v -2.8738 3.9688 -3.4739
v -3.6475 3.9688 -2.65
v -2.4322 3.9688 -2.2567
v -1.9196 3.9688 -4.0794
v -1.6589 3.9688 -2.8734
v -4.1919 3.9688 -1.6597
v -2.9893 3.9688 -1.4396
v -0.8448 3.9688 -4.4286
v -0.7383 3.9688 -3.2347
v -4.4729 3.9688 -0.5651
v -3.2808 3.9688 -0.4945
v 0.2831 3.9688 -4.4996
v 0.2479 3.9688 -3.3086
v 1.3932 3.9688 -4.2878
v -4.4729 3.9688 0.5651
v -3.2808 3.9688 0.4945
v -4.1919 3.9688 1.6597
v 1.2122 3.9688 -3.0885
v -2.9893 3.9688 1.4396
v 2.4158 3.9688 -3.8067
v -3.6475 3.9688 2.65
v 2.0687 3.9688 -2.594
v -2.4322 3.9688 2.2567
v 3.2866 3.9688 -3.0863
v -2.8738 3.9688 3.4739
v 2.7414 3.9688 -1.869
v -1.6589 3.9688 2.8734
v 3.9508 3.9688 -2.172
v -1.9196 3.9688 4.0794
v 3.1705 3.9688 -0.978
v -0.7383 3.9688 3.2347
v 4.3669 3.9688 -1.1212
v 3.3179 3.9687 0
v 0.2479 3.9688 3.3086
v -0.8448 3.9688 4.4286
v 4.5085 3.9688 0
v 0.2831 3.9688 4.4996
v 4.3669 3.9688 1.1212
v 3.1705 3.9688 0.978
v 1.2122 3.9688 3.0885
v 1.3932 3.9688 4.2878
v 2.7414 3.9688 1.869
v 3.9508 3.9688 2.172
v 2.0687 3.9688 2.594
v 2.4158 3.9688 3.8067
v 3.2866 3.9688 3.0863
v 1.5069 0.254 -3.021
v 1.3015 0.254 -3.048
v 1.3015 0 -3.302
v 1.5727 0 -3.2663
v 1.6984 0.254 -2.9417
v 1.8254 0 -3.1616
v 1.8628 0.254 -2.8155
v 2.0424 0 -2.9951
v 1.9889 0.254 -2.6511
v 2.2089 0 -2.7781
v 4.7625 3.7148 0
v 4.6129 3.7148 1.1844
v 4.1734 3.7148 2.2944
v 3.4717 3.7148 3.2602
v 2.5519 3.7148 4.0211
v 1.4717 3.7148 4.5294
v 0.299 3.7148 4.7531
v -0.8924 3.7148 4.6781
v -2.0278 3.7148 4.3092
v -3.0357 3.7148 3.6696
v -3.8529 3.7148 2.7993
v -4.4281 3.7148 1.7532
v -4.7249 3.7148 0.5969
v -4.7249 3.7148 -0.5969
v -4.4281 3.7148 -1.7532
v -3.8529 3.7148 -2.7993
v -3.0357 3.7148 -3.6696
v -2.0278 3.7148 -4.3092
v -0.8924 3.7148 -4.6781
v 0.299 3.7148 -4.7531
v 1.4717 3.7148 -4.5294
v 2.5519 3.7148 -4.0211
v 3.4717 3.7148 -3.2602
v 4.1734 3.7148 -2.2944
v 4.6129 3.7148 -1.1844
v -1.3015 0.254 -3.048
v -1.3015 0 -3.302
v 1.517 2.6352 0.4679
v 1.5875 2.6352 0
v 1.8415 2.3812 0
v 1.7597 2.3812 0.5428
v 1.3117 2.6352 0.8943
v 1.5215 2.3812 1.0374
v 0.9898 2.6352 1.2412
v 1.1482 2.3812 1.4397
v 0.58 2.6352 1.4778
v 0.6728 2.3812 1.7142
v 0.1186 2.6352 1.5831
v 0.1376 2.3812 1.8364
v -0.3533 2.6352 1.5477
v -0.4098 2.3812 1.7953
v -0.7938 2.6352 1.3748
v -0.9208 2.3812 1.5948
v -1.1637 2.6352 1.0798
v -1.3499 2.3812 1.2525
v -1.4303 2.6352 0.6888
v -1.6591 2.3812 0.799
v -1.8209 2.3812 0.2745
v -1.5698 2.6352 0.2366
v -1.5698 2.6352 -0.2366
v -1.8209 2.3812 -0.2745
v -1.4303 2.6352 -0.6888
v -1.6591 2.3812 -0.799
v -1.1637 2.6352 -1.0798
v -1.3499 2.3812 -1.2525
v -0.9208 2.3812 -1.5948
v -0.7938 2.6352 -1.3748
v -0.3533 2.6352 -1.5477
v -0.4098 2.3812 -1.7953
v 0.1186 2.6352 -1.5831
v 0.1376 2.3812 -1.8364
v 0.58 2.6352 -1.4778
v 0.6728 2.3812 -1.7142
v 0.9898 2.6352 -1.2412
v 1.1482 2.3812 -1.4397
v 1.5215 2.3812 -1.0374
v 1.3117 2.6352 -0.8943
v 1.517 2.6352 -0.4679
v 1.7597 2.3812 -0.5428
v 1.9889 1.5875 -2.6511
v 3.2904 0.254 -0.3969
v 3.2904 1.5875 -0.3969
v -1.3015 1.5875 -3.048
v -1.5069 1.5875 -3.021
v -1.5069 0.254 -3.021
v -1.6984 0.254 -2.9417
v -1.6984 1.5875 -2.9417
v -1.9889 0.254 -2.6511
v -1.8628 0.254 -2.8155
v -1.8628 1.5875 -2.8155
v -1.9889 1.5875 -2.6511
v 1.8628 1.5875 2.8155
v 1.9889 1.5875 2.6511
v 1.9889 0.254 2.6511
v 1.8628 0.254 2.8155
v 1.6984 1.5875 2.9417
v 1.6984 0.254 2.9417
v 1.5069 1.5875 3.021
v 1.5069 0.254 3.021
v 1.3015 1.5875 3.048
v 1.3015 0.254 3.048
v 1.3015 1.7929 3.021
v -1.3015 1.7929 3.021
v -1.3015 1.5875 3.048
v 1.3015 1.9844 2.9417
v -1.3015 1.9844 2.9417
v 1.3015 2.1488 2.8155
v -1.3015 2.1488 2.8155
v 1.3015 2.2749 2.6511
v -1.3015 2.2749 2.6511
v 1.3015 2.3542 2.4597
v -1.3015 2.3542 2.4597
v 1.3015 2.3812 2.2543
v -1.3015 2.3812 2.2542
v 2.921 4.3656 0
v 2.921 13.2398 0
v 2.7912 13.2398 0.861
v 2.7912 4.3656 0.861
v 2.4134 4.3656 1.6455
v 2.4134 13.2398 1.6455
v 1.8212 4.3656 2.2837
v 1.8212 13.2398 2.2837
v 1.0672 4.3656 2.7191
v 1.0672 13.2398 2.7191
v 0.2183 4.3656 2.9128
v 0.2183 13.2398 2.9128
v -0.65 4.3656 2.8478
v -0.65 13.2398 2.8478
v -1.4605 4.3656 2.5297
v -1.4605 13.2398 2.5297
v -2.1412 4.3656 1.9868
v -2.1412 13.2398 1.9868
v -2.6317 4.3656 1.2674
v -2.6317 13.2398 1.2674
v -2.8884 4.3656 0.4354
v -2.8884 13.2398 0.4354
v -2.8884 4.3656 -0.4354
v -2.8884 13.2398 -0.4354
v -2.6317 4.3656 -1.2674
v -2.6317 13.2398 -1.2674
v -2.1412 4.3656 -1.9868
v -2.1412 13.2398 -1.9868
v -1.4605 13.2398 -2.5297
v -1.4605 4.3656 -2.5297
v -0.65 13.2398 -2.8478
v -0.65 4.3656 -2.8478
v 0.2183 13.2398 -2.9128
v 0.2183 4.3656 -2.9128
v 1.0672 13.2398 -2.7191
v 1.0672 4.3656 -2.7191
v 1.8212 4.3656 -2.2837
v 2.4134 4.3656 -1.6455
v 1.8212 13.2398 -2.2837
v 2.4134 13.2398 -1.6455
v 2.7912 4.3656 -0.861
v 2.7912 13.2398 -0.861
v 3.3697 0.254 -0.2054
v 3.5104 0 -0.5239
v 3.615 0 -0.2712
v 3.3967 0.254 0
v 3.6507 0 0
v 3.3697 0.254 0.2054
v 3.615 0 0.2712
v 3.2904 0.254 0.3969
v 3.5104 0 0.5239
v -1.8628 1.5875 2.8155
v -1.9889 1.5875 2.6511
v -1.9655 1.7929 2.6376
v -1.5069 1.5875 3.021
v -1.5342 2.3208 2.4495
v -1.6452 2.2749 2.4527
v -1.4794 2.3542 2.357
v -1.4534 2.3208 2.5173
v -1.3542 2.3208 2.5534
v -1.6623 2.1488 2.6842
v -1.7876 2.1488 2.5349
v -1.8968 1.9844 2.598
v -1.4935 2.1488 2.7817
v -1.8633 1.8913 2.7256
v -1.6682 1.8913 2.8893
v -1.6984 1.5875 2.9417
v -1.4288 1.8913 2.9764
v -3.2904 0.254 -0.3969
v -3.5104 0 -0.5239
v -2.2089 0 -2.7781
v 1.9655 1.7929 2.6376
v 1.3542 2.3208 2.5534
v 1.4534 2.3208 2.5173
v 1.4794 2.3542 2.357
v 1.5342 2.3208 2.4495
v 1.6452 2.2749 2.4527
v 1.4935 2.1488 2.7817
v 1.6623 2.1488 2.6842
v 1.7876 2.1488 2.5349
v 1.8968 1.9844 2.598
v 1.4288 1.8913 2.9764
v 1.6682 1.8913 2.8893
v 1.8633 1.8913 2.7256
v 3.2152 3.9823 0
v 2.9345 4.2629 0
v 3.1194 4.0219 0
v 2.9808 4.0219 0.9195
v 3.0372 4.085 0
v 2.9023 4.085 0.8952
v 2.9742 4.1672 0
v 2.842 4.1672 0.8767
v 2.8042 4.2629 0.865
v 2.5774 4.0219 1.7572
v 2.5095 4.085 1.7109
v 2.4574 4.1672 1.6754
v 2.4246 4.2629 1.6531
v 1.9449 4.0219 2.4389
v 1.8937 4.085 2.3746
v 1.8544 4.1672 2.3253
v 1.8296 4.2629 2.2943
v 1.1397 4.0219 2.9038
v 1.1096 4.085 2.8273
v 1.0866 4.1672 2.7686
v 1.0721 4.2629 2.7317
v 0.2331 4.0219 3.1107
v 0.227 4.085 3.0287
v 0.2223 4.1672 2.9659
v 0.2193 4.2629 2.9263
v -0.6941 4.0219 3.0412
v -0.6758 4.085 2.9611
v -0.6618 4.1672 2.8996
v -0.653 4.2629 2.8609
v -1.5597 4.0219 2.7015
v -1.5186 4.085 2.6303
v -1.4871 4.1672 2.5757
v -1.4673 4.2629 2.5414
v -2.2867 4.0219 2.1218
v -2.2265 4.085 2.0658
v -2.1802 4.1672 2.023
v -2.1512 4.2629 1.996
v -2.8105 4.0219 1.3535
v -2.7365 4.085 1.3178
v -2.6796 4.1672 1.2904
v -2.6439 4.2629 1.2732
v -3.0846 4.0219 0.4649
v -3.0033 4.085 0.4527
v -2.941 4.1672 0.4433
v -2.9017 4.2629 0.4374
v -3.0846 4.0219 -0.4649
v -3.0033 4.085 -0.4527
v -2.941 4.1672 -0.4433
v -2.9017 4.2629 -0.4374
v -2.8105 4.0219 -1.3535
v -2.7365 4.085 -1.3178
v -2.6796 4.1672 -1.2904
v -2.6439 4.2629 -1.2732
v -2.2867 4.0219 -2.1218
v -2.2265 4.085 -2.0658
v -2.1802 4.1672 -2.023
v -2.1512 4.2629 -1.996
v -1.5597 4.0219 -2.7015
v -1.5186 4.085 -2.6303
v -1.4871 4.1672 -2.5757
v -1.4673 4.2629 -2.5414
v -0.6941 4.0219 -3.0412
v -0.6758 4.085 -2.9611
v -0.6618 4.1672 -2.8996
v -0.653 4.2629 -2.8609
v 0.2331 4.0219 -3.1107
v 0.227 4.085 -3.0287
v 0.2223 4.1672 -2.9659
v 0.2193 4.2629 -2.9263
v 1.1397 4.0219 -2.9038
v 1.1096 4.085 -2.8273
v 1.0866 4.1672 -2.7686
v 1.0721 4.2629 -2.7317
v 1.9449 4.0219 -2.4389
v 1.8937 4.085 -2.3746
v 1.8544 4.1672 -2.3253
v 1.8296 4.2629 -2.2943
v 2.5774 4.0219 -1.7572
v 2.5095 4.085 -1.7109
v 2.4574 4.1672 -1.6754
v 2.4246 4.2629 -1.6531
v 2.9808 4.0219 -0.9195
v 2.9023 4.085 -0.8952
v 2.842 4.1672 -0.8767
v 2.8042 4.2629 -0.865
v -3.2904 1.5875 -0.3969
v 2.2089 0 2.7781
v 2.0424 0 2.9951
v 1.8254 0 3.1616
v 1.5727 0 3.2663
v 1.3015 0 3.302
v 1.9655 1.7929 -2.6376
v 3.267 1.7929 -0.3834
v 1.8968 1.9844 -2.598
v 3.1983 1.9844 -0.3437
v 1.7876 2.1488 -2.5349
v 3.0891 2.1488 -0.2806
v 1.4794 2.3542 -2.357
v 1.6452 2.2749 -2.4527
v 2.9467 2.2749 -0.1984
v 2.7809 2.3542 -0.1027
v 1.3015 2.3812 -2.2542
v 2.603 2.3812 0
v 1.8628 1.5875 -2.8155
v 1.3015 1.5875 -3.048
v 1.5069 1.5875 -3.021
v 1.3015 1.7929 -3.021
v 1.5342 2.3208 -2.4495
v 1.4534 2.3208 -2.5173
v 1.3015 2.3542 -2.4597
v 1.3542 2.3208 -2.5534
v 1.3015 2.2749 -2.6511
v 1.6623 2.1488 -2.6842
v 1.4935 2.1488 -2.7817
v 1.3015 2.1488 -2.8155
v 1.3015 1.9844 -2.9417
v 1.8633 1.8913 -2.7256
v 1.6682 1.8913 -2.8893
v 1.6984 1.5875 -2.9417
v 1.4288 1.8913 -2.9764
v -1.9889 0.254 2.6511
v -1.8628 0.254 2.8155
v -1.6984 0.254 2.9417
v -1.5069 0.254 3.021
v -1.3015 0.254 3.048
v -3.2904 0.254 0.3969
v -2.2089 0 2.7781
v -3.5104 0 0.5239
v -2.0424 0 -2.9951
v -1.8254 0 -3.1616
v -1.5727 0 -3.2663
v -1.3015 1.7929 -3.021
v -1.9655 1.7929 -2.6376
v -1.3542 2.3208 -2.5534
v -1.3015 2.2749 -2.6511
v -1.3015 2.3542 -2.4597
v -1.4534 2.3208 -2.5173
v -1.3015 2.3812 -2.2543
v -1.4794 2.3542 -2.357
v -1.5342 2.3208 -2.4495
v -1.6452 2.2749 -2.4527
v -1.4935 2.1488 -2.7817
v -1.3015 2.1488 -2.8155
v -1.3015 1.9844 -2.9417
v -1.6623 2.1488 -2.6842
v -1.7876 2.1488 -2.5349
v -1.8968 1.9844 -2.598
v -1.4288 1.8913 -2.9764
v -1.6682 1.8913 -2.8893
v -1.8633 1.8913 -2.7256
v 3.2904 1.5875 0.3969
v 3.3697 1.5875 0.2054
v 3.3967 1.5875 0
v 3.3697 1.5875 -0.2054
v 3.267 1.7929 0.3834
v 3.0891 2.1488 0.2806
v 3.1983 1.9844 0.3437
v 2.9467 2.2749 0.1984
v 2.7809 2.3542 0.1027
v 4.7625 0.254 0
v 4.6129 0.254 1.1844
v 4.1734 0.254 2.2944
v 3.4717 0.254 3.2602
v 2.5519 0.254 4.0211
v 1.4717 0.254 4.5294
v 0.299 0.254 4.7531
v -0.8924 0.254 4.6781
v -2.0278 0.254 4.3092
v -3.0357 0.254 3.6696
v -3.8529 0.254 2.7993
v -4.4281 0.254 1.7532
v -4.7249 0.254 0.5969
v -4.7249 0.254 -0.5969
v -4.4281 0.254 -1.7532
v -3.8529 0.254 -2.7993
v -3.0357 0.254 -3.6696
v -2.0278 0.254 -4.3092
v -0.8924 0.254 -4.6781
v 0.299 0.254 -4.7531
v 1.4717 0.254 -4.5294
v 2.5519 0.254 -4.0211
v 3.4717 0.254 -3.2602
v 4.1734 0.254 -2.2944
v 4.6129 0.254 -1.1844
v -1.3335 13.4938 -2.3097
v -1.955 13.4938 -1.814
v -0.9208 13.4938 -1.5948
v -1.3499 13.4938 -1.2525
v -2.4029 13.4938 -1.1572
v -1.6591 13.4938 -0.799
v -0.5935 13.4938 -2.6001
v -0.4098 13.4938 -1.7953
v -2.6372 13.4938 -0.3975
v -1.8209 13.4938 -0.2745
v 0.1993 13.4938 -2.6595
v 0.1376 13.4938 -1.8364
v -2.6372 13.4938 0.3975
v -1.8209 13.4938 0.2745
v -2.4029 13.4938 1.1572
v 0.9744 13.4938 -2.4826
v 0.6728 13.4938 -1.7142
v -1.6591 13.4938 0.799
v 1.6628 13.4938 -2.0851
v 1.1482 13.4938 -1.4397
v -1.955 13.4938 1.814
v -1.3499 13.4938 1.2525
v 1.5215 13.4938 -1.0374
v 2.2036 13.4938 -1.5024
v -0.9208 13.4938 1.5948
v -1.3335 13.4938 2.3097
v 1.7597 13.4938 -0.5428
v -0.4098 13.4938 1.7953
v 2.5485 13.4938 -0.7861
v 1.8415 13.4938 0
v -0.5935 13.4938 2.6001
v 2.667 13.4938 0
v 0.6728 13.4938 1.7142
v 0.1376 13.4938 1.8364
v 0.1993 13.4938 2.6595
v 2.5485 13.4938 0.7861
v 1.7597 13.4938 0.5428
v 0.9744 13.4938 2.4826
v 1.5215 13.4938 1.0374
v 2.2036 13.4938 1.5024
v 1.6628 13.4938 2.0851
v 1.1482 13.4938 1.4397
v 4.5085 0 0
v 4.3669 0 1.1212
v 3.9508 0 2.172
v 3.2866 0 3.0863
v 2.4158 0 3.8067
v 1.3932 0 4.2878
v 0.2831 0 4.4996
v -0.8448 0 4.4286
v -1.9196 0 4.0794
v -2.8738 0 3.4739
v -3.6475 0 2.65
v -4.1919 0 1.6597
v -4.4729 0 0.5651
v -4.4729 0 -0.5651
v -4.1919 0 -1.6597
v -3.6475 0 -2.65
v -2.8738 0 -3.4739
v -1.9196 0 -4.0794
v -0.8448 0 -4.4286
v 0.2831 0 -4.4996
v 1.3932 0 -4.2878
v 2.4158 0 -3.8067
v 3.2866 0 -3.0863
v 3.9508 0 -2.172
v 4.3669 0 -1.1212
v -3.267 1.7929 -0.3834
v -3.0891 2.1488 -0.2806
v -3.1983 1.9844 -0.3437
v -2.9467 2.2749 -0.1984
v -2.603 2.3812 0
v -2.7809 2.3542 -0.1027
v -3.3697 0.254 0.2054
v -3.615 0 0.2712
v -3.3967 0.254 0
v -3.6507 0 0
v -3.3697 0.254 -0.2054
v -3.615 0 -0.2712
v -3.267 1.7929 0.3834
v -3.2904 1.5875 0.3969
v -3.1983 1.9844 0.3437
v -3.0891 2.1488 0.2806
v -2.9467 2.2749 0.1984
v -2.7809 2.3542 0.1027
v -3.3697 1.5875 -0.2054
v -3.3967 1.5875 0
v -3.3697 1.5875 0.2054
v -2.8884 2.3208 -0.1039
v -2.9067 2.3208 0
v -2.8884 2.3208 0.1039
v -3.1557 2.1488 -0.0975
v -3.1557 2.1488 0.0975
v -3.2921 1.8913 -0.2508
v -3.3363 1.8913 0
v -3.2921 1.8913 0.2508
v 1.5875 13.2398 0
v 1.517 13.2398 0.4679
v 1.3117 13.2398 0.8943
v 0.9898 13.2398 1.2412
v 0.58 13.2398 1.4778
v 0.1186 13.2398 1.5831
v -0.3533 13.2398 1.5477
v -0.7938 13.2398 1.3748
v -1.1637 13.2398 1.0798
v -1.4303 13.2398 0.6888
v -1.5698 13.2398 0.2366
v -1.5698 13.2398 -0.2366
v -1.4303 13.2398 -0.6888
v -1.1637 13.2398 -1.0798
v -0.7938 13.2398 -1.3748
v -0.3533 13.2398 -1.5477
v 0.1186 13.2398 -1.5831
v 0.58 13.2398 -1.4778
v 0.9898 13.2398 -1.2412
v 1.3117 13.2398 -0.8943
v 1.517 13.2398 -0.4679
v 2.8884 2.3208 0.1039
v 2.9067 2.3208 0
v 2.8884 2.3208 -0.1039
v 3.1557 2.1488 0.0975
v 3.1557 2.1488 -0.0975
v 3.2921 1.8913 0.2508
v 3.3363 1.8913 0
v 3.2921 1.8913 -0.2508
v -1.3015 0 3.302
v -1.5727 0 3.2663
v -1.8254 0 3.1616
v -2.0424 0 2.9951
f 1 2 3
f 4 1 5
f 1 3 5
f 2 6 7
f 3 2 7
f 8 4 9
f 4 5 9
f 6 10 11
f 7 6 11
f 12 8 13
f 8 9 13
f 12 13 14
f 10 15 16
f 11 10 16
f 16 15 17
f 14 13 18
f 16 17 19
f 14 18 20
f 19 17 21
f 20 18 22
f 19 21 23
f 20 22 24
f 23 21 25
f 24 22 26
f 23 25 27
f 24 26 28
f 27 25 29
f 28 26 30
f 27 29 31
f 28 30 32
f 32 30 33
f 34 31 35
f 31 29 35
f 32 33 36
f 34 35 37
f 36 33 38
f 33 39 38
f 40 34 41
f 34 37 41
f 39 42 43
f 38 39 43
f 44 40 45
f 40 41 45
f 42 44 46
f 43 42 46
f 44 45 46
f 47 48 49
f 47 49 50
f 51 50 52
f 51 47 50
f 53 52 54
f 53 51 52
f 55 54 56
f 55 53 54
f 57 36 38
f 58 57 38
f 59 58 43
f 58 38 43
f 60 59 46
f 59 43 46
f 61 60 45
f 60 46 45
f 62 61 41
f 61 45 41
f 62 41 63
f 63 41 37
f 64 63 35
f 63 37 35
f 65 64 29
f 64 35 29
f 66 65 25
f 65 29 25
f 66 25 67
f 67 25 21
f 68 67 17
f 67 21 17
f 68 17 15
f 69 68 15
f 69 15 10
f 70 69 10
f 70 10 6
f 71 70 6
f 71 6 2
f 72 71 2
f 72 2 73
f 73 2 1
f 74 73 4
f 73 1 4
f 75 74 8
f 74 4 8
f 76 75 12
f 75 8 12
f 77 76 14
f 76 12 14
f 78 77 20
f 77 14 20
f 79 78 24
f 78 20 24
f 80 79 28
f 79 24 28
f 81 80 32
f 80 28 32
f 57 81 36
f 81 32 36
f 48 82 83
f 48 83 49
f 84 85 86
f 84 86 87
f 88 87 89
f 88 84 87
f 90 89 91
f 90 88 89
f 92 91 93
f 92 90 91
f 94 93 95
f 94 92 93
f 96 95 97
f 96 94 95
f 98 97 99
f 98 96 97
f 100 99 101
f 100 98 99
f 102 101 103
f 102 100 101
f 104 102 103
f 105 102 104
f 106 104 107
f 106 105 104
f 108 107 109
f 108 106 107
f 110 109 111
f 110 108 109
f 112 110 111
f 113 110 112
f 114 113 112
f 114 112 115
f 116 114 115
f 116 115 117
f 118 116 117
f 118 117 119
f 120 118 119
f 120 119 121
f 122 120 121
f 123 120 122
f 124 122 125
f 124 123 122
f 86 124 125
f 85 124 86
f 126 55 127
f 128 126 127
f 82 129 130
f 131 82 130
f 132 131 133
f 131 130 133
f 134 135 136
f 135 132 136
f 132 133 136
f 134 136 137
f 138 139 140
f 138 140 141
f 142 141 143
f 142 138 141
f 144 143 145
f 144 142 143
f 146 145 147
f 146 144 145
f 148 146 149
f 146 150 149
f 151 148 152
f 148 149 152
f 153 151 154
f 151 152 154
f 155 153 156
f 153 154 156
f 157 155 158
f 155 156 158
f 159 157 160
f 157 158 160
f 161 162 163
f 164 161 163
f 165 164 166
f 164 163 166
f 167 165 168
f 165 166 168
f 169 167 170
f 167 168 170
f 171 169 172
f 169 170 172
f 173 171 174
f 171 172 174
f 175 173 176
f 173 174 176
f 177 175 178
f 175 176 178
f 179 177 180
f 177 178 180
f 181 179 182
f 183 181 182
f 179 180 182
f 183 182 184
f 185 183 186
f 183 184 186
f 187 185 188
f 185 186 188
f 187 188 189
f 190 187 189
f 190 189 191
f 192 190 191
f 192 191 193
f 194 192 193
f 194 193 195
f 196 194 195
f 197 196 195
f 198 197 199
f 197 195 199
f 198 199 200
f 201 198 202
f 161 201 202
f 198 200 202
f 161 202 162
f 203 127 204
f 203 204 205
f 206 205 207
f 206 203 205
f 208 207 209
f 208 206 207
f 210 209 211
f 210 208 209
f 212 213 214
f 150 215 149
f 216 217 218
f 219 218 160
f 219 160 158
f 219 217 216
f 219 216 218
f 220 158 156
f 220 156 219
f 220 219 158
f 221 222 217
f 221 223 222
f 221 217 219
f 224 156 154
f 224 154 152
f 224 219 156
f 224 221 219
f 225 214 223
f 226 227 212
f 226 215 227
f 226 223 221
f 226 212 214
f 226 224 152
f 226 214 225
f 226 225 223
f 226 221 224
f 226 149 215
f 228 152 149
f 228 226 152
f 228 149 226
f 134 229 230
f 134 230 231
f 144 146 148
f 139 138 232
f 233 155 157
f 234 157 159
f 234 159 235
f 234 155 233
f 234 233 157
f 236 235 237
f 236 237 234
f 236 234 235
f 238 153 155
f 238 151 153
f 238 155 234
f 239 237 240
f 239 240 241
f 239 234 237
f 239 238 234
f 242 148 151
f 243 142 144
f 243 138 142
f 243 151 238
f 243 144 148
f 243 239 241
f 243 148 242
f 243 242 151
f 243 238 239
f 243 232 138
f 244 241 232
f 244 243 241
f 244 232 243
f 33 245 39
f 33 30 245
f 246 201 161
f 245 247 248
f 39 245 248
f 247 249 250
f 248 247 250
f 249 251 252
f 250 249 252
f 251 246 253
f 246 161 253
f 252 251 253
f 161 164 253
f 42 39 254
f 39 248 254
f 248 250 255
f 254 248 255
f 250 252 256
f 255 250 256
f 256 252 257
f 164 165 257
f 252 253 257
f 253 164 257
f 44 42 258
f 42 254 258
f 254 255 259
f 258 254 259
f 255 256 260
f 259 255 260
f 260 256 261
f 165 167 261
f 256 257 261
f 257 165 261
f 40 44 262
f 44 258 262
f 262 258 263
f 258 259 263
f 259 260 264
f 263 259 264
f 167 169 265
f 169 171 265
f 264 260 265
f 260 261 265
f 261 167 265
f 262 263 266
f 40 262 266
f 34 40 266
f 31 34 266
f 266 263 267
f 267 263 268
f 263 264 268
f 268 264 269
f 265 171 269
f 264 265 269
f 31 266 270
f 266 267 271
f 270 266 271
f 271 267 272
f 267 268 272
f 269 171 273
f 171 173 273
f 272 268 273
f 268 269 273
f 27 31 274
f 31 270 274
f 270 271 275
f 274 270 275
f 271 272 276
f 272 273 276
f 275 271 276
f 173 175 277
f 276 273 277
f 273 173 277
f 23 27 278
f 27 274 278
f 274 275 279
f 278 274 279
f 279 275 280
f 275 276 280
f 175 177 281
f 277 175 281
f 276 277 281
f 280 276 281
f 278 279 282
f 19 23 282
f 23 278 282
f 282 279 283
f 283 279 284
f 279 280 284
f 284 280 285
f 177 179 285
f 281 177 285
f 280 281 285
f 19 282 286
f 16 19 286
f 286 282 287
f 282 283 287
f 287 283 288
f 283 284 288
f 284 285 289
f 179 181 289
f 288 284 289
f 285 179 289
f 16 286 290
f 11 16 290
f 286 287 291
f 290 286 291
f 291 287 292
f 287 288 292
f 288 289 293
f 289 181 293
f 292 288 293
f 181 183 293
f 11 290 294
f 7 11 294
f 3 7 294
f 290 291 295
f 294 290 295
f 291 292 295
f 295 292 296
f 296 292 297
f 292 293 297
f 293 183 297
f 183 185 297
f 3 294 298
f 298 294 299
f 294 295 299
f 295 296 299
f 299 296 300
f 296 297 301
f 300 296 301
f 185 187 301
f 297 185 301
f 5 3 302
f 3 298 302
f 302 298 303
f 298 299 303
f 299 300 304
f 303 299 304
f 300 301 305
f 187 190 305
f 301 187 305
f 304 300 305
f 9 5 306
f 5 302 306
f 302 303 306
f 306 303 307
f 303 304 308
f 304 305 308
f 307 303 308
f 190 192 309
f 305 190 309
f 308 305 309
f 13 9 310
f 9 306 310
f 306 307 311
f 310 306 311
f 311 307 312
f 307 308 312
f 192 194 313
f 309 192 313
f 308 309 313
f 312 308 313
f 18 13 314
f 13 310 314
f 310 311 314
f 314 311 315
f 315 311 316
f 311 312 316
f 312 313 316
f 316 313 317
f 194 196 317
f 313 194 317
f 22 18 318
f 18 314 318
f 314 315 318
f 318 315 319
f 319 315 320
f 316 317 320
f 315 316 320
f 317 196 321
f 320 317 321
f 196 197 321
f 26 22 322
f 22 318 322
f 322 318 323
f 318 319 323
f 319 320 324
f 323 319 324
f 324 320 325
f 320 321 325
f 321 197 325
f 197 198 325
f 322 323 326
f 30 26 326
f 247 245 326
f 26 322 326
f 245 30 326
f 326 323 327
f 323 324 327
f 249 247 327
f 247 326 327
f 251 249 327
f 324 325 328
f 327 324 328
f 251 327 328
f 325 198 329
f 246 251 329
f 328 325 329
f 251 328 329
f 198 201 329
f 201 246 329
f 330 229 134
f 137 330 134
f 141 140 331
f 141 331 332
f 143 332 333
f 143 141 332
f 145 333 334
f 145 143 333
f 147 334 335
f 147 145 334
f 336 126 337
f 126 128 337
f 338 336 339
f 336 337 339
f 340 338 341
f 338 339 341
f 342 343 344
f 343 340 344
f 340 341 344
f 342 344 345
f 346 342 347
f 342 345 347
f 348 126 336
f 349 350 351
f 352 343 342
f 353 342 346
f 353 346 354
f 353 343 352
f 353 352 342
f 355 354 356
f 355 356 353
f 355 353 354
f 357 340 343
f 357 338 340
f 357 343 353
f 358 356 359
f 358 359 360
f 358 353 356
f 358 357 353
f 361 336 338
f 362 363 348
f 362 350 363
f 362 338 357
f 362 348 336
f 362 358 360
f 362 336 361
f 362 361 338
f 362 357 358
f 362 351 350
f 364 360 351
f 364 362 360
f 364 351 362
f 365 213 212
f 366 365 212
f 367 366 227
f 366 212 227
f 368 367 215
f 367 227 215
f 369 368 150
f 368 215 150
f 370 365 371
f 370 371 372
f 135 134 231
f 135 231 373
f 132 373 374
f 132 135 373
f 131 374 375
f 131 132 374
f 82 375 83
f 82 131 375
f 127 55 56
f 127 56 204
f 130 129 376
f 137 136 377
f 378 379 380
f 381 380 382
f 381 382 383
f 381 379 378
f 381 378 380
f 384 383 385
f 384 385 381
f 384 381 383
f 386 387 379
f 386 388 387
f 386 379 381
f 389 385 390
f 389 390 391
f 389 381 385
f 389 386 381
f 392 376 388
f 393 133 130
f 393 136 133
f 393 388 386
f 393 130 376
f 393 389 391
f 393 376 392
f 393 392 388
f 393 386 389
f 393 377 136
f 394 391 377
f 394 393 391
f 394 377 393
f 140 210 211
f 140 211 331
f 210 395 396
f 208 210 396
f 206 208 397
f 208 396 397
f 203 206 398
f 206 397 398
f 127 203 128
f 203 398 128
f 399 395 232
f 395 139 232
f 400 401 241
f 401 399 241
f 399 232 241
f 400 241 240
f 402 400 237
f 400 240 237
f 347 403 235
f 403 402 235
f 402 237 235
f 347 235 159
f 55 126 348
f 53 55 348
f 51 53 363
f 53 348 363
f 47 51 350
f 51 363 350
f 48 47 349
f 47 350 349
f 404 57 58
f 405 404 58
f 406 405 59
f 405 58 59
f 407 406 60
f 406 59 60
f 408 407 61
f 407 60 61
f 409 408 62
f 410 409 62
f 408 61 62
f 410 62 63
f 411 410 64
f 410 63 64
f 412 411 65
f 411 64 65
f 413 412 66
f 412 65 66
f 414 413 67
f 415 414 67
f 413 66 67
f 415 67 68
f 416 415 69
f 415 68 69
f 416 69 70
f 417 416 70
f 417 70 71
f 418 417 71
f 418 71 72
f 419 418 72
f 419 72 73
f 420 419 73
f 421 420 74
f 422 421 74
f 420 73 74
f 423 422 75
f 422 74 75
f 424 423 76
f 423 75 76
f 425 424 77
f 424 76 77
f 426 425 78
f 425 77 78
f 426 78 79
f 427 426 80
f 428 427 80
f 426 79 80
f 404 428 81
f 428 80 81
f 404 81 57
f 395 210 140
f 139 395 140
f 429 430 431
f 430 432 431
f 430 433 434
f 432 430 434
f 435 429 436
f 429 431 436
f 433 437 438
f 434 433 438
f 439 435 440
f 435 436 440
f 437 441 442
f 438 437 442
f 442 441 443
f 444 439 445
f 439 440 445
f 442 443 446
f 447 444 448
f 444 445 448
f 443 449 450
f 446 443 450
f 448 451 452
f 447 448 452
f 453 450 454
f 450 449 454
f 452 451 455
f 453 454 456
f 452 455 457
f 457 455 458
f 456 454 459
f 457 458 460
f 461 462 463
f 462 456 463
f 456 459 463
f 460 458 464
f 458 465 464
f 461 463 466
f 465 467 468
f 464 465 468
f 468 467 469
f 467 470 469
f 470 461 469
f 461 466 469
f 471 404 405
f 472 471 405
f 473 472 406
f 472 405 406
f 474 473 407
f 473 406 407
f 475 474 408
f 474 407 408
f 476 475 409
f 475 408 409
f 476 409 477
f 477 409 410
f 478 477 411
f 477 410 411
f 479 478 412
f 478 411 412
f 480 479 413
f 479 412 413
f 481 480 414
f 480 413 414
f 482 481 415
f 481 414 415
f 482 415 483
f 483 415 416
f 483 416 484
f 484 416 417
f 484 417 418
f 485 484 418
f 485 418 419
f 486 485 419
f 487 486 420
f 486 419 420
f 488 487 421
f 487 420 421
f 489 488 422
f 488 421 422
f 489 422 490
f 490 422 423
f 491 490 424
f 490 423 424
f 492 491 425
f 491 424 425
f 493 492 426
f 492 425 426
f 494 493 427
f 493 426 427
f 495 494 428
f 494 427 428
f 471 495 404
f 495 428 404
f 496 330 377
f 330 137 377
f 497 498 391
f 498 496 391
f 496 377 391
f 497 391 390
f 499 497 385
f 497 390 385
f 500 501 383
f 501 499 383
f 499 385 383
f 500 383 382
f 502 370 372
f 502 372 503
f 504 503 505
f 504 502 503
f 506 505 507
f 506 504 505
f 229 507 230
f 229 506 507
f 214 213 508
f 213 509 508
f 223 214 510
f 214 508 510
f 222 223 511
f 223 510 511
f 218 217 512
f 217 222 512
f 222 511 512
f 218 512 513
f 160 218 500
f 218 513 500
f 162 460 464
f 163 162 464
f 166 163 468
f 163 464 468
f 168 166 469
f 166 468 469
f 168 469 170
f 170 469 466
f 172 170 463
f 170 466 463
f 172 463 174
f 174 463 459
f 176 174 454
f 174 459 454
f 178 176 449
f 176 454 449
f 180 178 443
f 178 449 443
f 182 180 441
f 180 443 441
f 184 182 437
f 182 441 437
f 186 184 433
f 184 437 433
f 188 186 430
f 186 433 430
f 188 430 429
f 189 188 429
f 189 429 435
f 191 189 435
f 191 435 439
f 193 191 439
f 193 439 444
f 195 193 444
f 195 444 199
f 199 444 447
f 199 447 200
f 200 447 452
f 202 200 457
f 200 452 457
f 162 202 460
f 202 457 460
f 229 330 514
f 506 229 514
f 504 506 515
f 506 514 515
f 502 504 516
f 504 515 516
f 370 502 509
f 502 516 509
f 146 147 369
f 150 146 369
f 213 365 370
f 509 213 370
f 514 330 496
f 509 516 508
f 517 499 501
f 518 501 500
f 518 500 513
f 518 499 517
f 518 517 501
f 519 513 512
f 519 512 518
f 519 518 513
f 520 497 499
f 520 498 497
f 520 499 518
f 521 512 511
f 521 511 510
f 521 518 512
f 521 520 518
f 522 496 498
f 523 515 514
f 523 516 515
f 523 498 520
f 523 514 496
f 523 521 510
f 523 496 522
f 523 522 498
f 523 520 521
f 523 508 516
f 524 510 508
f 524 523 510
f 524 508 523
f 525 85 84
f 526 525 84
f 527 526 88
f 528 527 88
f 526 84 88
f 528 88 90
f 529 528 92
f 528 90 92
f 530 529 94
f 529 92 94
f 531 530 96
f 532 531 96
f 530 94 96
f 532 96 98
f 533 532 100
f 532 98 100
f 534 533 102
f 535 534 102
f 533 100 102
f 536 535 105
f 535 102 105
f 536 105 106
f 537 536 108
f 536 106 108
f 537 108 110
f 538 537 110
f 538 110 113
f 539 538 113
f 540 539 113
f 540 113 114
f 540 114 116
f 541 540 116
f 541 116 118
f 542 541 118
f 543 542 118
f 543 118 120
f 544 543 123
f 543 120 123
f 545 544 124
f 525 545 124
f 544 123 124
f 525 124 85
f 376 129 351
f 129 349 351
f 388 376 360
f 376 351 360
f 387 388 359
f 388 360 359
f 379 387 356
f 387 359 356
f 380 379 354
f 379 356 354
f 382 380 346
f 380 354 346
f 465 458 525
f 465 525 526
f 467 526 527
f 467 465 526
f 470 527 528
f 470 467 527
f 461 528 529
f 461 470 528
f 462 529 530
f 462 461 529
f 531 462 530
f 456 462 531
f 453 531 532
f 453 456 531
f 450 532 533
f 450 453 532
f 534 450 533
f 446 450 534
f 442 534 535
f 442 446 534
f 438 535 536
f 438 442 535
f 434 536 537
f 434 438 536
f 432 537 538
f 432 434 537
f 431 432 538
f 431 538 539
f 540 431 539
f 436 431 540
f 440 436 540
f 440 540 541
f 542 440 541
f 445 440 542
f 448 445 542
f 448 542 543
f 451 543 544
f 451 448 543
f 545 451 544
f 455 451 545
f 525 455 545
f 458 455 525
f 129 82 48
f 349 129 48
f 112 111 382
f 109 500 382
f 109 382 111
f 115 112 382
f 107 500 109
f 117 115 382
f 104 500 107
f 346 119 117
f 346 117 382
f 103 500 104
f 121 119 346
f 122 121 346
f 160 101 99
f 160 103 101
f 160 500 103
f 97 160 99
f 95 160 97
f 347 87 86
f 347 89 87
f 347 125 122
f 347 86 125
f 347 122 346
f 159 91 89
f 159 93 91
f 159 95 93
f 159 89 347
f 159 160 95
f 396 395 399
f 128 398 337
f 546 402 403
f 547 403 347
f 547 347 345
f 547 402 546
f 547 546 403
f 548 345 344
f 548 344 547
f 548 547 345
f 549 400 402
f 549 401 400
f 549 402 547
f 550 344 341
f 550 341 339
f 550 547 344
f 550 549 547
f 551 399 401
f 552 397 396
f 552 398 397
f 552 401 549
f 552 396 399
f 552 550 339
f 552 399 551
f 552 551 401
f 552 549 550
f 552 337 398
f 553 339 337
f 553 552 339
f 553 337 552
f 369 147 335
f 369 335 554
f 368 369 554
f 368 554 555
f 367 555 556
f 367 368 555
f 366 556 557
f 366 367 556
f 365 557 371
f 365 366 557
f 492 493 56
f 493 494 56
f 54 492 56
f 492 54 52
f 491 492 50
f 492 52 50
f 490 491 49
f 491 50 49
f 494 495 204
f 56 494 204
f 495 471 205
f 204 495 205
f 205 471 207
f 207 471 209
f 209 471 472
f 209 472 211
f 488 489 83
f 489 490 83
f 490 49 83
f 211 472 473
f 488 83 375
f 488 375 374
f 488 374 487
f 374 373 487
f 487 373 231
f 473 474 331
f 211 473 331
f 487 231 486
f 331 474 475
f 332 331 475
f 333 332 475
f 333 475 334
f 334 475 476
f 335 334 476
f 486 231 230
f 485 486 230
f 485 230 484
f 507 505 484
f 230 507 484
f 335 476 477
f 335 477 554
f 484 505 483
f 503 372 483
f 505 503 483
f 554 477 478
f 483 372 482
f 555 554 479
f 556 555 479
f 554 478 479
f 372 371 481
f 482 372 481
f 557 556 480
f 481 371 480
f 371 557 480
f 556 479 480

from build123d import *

# Parameters (mm, degrees)
CUT_EXTRUDE1_DEPTH = 2.38125
FILLET1_R          = 0.396875
FILLET2_R          = 0.79375
CHAMFER1_SIZE      = 0.254


with BuildPart() as part:
    # Sketch1 → Revolve1 (revolve)
    with BuildSketch(Plane.XY):
        Polygon((1.5875, 0), (4.7625, 0), (4.7625, 3.96875), (2.921, 3.96875), (2.921, 13.49375), (1.5875, 13.49375), align=None)
    revolve(axis=Axis((0, 7.886499903, 0), (0, -1, 0)))

    # Sketch2 → Cut-Extrude1 (cut)
    with BuildSketch(Plane.XZ):
        Polygon((1.75976362, 3.048), (-1.75976362, 3.048), (-3.519527241, 0), (-1.75976362, -3.048), (1.75976362, -3.048), (3.519527241, 0), align=None)
    extrude(amount=-CUT_EXTRUDE1_DEPTH, mode=Mode.SUBTRACT)

    # Fillet1
    fillet1_edges = [part.edges().sort_by_distance(p)[0] for p in [
        (-2.921, 3.96875, 0),
    ]]
    fillet(fillet1_edges, radius=FILLET1_R)

    # Fillet2
    fillet2_edges = [part.edges().sort_by_distance(p)[0] for p in [
        (2.639645431, 2.38125, 1.524),
        (1.75976362, 1.190625, 3.048),
        (2.639645431, 2.38125, -1.524),
        (3.519527241, 1.190625, 0),
        (0, 2.38125, -3.048),
        (1.75976362, 1.190625, -3.048),
        (-2.639645431, 2.38125, -1.524),
        (-1.75976362, 1.190625, -3.048),
        (-2.639645431, 2.38125, 1.524),
        (-3.519527241, 1.190625, 0),
        (0, 2.38125, 3.048),
        (-1.75976362, 1.190625, 3.048),
    ]]
    fillet(fillet2_edges, radius=FILLET2_R)

    # Chamfer1
    chamfer1_edges = [part.edges().sort_by_distance(p)[0] for p in [
        (-1.5875, 2.38125, 0),
        (2.639645431, 0, -1.524),
        (0, 0, -3.048),
        (-2.639645431, 0, -1.524),
        (-2.639645431, 0, 1.524),
        (-1.5875, 13.49375, 0),
        (2.639645431, 0, 1.524),
        (-2.921, 13.49375, 0),
        (0, 0, 3.048),
        (3.396733689, 0, 0),
        (1.698366844, 0, -2.941657664),
        (-1.698366844, 0, -2.941657664),
        (-3.396733689, 0, 0),
        (1.698366844, 0, 2.941657664),
        (-1.698366844, 0, 2.941657664),
        (-4.7625, 3.96875, 0),
        (-4.7625, 0, 0),
    ]]
    chamfer(chamfer1_edges, length=CHAMFER1_SIZE)


solid = part.part
